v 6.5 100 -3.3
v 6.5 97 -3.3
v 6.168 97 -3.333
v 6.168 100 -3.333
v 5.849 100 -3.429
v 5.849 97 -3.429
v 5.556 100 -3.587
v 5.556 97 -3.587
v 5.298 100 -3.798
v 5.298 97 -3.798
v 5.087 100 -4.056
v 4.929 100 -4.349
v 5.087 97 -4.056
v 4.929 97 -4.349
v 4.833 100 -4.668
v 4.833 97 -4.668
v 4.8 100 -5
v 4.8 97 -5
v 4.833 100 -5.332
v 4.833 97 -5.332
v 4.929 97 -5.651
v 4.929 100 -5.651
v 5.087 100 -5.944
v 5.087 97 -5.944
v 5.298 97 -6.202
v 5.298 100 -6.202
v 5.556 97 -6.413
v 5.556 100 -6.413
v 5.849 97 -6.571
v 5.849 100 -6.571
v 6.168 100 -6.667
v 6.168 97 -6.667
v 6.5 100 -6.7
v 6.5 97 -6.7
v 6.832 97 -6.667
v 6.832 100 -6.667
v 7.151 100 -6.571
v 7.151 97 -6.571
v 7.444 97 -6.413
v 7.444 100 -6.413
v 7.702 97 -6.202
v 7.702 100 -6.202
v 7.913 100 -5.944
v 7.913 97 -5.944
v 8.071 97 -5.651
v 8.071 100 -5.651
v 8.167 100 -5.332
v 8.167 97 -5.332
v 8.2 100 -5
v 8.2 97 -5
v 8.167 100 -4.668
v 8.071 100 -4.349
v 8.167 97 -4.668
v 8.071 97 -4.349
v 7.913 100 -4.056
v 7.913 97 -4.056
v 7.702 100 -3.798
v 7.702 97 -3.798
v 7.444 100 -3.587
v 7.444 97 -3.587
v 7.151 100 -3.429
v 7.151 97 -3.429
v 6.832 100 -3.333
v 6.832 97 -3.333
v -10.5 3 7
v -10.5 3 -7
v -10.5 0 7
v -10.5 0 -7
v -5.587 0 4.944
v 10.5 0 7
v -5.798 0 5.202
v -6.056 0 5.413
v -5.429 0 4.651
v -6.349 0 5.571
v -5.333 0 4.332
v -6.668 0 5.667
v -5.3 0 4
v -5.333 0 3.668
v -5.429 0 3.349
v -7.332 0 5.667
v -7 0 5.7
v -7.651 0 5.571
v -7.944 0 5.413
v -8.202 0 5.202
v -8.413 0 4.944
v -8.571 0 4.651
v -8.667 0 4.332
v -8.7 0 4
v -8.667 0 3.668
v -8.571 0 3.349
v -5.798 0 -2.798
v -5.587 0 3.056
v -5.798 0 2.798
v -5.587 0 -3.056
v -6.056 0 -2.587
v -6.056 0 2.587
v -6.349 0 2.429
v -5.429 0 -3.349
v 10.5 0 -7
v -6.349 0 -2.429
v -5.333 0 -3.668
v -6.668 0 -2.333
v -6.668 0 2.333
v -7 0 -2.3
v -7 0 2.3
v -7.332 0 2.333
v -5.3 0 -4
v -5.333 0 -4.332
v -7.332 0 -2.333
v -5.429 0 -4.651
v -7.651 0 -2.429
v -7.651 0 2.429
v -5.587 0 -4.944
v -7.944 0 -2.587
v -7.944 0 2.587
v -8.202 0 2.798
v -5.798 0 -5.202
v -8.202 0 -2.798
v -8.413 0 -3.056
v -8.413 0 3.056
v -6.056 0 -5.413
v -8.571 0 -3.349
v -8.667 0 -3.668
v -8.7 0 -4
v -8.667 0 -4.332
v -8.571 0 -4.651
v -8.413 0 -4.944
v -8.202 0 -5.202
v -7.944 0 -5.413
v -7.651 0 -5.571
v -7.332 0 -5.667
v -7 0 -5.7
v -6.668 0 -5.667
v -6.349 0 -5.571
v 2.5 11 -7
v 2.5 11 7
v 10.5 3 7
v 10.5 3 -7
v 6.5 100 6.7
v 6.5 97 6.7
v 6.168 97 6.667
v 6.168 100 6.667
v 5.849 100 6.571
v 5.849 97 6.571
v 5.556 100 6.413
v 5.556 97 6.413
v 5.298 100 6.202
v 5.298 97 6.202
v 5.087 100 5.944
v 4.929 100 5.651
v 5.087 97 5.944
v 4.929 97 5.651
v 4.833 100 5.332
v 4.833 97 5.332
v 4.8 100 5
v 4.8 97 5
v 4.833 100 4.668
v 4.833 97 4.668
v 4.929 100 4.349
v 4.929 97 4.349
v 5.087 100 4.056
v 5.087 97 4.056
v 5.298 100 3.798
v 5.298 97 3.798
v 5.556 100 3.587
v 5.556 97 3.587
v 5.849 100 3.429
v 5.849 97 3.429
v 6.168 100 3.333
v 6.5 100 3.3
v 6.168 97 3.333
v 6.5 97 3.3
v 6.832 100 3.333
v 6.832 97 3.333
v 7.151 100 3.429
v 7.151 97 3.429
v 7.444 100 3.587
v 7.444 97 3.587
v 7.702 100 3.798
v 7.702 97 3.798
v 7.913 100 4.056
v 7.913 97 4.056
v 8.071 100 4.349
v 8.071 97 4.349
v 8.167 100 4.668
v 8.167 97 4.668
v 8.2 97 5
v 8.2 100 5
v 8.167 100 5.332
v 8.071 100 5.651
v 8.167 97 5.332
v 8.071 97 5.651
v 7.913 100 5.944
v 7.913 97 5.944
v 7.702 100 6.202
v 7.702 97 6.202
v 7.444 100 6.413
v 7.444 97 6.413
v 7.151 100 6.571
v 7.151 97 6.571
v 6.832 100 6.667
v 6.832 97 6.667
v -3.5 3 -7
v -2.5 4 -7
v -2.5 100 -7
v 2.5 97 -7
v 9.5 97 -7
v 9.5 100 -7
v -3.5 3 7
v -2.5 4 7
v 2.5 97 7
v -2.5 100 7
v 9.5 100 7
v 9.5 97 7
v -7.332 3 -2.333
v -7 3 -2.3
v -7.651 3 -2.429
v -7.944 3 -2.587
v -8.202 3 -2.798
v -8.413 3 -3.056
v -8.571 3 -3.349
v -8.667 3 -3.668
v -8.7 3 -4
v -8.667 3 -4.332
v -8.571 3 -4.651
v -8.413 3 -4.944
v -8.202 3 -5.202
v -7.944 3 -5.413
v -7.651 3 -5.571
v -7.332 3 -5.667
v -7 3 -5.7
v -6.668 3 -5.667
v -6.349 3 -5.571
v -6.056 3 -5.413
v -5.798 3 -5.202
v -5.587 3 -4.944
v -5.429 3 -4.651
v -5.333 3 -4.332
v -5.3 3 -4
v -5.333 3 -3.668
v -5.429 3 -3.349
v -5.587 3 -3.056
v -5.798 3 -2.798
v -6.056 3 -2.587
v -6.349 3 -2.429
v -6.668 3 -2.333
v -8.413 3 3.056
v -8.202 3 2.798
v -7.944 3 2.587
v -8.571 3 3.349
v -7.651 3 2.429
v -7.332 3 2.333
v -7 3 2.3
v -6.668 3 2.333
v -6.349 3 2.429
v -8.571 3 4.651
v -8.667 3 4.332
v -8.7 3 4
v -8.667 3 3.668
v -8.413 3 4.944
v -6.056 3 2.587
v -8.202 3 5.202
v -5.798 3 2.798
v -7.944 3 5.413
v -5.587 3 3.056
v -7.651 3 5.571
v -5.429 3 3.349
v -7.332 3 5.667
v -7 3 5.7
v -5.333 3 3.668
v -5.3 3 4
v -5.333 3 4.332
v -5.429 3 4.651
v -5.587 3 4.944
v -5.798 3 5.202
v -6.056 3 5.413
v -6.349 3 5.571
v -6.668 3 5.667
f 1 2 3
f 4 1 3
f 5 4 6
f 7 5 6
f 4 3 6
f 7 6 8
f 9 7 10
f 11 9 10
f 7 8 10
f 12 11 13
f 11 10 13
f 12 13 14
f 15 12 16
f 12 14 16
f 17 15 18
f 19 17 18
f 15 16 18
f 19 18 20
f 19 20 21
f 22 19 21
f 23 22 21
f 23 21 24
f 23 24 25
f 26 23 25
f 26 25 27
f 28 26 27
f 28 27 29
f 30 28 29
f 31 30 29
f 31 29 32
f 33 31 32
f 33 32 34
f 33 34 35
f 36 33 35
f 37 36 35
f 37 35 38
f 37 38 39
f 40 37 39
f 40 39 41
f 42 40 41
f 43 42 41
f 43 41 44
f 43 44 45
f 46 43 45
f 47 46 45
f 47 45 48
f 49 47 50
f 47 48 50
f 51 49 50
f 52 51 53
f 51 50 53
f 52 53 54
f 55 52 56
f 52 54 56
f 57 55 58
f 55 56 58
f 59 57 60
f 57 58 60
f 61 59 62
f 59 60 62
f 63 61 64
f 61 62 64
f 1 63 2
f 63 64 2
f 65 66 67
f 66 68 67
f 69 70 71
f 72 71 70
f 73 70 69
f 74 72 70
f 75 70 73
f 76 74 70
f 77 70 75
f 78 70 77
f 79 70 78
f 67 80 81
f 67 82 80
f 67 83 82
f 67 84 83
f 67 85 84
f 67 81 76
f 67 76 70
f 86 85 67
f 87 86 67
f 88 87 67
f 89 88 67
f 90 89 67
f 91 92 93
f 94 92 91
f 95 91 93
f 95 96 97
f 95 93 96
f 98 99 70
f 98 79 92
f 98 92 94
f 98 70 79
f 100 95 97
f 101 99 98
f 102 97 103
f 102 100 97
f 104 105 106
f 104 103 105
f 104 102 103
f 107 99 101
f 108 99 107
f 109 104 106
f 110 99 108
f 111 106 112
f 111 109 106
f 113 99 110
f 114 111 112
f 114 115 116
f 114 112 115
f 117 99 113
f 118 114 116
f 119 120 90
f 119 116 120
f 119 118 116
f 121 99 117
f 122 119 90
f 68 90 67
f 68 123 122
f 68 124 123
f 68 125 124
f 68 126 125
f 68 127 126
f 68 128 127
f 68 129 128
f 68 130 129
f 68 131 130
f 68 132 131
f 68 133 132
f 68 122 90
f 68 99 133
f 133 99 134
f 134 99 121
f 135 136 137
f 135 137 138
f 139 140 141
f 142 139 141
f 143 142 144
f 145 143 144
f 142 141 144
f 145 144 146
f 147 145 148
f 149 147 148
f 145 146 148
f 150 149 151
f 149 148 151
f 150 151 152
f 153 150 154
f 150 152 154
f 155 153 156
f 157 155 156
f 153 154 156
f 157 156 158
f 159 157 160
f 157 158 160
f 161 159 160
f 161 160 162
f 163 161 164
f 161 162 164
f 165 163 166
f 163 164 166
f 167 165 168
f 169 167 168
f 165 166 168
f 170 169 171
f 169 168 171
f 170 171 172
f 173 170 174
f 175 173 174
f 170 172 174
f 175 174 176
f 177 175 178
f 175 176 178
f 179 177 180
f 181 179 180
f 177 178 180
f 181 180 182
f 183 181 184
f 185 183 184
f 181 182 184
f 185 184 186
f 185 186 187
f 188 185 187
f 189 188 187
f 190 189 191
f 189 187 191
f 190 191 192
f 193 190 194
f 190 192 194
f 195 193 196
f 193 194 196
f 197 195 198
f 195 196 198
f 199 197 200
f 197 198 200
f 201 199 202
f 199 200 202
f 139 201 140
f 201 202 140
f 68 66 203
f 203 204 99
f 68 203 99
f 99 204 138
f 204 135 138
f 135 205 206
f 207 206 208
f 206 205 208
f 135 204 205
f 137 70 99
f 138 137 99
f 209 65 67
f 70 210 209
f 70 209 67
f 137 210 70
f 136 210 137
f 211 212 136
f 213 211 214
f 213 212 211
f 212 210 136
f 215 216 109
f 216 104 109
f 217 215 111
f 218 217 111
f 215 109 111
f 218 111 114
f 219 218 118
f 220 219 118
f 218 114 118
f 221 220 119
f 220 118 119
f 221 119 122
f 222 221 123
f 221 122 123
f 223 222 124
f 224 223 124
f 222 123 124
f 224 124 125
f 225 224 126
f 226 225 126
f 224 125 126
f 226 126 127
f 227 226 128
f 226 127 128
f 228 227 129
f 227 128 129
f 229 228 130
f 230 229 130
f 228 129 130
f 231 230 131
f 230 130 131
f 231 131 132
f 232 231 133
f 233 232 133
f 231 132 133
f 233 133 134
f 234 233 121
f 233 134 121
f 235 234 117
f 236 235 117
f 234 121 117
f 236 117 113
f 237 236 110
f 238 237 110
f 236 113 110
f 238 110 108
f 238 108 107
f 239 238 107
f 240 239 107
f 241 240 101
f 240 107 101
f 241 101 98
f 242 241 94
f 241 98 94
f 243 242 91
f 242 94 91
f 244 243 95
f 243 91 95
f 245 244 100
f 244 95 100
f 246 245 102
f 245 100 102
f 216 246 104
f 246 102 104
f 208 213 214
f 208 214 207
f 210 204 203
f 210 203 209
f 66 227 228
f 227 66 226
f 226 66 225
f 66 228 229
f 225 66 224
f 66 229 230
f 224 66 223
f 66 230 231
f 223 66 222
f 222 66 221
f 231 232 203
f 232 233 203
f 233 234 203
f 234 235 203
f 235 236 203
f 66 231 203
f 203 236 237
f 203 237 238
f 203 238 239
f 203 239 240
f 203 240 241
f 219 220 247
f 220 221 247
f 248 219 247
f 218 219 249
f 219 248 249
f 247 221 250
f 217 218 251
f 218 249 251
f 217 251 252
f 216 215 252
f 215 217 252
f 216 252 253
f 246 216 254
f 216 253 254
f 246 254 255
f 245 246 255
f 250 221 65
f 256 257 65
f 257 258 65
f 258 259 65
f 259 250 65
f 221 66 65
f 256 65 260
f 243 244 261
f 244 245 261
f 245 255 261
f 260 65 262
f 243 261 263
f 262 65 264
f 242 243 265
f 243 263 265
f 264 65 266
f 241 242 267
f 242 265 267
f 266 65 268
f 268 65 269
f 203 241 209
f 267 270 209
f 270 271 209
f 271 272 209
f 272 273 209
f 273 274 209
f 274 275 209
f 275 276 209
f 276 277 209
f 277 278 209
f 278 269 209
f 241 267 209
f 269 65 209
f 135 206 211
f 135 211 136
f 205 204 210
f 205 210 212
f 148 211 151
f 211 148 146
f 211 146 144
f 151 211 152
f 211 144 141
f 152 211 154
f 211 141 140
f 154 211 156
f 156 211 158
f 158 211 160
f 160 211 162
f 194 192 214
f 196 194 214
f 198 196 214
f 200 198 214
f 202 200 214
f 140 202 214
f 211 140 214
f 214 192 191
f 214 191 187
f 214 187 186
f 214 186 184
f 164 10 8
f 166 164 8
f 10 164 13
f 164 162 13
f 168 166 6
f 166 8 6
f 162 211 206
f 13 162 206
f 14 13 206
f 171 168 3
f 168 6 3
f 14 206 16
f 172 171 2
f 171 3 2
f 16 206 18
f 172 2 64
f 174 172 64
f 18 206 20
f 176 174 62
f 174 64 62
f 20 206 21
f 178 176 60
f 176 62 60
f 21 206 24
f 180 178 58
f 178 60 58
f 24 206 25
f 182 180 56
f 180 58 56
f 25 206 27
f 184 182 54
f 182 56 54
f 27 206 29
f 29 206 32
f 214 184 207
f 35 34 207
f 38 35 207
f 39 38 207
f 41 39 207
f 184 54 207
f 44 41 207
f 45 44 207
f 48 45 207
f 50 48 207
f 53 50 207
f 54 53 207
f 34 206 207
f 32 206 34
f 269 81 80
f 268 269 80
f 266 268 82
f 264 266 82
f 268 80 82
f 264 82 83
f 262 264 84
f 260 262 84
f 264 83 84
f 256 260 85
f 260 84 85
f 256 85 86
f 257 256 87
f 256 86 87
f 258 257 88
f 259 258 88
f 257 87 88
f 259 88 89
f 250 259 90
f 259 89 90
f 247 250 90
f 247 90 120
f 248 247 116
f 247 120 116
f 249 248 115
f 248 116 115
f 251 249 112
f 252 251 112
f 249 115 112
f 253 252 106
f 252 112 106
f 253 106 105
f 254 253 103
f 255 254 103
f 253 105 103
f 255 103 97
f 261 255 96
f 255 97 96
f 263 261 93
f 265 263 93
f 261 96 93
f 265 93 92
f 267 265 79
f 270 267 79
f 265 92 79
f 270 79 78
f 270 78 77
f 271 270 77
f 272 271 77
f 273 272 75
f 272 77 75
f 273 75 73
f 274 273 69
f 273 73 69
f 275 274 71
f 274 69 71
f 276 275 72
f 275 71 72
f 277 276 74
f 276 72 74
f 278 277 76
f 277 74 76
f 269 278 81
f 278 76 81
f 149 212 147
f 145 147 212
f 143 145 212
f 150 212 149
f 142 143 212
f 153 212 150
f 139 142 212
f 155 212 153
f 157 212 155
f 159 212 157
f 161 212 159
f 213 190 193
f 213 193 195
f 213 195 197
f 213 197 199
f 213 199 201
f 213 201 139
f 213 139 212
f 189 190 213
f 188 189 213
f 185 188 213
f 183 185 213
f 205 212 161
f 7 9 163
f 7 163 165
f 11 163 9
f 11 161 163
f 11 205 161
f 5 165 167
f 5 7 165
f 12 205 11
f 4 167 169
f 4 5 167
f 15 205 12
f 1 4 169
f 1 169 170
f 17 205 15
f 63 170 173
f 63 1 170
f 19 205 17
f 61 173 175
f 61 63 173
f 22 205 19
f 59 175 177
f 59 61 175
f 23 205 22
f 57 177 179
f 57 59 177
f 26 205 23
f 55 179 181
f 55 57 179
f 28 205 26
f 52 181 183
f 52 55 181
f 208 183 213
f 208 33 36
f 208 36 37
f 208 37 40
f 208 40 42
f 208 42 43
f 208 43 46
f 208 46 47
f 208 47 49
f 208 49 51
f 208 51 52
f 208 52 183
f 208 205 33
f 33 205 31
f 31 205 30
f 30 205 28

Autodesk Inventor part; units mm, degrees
ref_plane "YZ Plane" through (0, 0, 0) normal (1, 0, 0) x (0, 1, 0)
ref_plane "XZ Plane" through (0, 0, 0) normal (0, 1, 0) x (-1, 0, 0)
ref_plane "XY Plane" through (0, 0, 0) normal (0, 0, 1) x (1, 0, 0)
sketch "Sketch1" plane through (0, 0, 0) normal (0, 0, 1) x (1, 0, 0)
  line L0 (-2.5, 100) -> (2.5, 100)
  line L1 (2.5, 100) -> (2.5, 0)
  line L2 (2.5, 0) -> (-2.5, 0)
  line L3 (-2.5, 0) -> (-2.5, 100)
  line L4 (0, -20) -> (0, 120) projected
  line L5 (-3.5, 0) -> (3.5, 0) projected
  point P0 (0, 0)
  point P1 (0, 100)
  dimension "d0" = 5
  dimension "d1" = 100
extrude "Extrusion1" add sketch "Sketch1" along normal mid plane 14
sketch "Sketch2" plane through (-2.5, 100, 7) normal (0, 1, 0) x (1, 0, 0)
  line L0 (5, 0) -> (0, 0) projected
  line L1 (0, 0) -> (12, 0)
  line L2 (12, 0) -> (12, 14)
  line L3 (12, 14) -> (0, 14)
  line L4 (0, 14) -> (0, 0)
  line L5 (0, 14) -> (5, 14) projected
  line L6 (5, 14) -> (5, 0) projected
  point P0 (2.5, 7)
  dimension "d5" = 7
extrude "Extrusion2" add sketch "Sketch2" against normal blind 3
sketch "Sketch3" plane through (-2.5, 100, 7) normal (0, 1, 0) x (1, 0, 0)
  line L0 (12, 0) -> (12, 14) projected
  line L1 (0, 14) -> (12, 14) projected
  line L2 (0, 0) -> (12, 0) projected
  point P0 (2.5, 7)
  point P1 (9, 2)
  point P2 (9, 12)
  dimension "d8" = 3
  dimension "d9" = 2
  dimension "d10" = 2
hole "Hole1" at (6.5, 100, 5) at (6.5, 100, -5) direction (0, -1, 0) diameter 3.4 end through all
sketch "Sketch4" plane through (-2.5, 0, 7) normal (0, -1, 0) x (1, 0, 0)
  line L0 (-8, 0) -> (13, 0)
  line L1 (13, 0) -> (13, -14)
  line L2 (13, -14) -> (-8, -14)
  line L3 (-8, -14) -> (-8, 0)
  line L4 (0, 0) -> (5, 0) projected
  line L5 (5, -14) -> (0, -14) projected
  line L6 (0, -14) -> (0, 0) projected
  line L7 (12, -14) -> (12, 0) projected
  line L8 (5, 0) -> (5, -14) projected
  point P0 (2.5, -7)
  dimension "d18" = 8
  dimension "d20" = 8
extrude "Extrusion3" add sketch "Sketch4" against normal blind 3
sketch "Sketch5" plane through (-2.5, 3, 7) normal (0, 1, 0) x (1, 0, 0)
  line L0 (-4.5, 11) -> (-4.5, 3) construction
  line L1 (-8, 14) -> (-8, 0) construction
  point P0 (2.5, 7)
  point P1 (-4.5, 7)
  point P2 (-8, 7)
  dimension "d23" = 8
  dimension "d24" = 3.5
hole "Hole2" at (-7, 3, -4) at (-7, 3, 4) direction (0, -1, 0) diameter 3.4 end through all
chamfer "Chamfer1" distance 8 angle 45 1 edges at (2.5, 3, 0)
chamfer "Chamfer2" distance 1 angle 45 1 edges at (-2.5, 3, 0)
equation "\"d10\" = d9"
properties part number "compass mount"
